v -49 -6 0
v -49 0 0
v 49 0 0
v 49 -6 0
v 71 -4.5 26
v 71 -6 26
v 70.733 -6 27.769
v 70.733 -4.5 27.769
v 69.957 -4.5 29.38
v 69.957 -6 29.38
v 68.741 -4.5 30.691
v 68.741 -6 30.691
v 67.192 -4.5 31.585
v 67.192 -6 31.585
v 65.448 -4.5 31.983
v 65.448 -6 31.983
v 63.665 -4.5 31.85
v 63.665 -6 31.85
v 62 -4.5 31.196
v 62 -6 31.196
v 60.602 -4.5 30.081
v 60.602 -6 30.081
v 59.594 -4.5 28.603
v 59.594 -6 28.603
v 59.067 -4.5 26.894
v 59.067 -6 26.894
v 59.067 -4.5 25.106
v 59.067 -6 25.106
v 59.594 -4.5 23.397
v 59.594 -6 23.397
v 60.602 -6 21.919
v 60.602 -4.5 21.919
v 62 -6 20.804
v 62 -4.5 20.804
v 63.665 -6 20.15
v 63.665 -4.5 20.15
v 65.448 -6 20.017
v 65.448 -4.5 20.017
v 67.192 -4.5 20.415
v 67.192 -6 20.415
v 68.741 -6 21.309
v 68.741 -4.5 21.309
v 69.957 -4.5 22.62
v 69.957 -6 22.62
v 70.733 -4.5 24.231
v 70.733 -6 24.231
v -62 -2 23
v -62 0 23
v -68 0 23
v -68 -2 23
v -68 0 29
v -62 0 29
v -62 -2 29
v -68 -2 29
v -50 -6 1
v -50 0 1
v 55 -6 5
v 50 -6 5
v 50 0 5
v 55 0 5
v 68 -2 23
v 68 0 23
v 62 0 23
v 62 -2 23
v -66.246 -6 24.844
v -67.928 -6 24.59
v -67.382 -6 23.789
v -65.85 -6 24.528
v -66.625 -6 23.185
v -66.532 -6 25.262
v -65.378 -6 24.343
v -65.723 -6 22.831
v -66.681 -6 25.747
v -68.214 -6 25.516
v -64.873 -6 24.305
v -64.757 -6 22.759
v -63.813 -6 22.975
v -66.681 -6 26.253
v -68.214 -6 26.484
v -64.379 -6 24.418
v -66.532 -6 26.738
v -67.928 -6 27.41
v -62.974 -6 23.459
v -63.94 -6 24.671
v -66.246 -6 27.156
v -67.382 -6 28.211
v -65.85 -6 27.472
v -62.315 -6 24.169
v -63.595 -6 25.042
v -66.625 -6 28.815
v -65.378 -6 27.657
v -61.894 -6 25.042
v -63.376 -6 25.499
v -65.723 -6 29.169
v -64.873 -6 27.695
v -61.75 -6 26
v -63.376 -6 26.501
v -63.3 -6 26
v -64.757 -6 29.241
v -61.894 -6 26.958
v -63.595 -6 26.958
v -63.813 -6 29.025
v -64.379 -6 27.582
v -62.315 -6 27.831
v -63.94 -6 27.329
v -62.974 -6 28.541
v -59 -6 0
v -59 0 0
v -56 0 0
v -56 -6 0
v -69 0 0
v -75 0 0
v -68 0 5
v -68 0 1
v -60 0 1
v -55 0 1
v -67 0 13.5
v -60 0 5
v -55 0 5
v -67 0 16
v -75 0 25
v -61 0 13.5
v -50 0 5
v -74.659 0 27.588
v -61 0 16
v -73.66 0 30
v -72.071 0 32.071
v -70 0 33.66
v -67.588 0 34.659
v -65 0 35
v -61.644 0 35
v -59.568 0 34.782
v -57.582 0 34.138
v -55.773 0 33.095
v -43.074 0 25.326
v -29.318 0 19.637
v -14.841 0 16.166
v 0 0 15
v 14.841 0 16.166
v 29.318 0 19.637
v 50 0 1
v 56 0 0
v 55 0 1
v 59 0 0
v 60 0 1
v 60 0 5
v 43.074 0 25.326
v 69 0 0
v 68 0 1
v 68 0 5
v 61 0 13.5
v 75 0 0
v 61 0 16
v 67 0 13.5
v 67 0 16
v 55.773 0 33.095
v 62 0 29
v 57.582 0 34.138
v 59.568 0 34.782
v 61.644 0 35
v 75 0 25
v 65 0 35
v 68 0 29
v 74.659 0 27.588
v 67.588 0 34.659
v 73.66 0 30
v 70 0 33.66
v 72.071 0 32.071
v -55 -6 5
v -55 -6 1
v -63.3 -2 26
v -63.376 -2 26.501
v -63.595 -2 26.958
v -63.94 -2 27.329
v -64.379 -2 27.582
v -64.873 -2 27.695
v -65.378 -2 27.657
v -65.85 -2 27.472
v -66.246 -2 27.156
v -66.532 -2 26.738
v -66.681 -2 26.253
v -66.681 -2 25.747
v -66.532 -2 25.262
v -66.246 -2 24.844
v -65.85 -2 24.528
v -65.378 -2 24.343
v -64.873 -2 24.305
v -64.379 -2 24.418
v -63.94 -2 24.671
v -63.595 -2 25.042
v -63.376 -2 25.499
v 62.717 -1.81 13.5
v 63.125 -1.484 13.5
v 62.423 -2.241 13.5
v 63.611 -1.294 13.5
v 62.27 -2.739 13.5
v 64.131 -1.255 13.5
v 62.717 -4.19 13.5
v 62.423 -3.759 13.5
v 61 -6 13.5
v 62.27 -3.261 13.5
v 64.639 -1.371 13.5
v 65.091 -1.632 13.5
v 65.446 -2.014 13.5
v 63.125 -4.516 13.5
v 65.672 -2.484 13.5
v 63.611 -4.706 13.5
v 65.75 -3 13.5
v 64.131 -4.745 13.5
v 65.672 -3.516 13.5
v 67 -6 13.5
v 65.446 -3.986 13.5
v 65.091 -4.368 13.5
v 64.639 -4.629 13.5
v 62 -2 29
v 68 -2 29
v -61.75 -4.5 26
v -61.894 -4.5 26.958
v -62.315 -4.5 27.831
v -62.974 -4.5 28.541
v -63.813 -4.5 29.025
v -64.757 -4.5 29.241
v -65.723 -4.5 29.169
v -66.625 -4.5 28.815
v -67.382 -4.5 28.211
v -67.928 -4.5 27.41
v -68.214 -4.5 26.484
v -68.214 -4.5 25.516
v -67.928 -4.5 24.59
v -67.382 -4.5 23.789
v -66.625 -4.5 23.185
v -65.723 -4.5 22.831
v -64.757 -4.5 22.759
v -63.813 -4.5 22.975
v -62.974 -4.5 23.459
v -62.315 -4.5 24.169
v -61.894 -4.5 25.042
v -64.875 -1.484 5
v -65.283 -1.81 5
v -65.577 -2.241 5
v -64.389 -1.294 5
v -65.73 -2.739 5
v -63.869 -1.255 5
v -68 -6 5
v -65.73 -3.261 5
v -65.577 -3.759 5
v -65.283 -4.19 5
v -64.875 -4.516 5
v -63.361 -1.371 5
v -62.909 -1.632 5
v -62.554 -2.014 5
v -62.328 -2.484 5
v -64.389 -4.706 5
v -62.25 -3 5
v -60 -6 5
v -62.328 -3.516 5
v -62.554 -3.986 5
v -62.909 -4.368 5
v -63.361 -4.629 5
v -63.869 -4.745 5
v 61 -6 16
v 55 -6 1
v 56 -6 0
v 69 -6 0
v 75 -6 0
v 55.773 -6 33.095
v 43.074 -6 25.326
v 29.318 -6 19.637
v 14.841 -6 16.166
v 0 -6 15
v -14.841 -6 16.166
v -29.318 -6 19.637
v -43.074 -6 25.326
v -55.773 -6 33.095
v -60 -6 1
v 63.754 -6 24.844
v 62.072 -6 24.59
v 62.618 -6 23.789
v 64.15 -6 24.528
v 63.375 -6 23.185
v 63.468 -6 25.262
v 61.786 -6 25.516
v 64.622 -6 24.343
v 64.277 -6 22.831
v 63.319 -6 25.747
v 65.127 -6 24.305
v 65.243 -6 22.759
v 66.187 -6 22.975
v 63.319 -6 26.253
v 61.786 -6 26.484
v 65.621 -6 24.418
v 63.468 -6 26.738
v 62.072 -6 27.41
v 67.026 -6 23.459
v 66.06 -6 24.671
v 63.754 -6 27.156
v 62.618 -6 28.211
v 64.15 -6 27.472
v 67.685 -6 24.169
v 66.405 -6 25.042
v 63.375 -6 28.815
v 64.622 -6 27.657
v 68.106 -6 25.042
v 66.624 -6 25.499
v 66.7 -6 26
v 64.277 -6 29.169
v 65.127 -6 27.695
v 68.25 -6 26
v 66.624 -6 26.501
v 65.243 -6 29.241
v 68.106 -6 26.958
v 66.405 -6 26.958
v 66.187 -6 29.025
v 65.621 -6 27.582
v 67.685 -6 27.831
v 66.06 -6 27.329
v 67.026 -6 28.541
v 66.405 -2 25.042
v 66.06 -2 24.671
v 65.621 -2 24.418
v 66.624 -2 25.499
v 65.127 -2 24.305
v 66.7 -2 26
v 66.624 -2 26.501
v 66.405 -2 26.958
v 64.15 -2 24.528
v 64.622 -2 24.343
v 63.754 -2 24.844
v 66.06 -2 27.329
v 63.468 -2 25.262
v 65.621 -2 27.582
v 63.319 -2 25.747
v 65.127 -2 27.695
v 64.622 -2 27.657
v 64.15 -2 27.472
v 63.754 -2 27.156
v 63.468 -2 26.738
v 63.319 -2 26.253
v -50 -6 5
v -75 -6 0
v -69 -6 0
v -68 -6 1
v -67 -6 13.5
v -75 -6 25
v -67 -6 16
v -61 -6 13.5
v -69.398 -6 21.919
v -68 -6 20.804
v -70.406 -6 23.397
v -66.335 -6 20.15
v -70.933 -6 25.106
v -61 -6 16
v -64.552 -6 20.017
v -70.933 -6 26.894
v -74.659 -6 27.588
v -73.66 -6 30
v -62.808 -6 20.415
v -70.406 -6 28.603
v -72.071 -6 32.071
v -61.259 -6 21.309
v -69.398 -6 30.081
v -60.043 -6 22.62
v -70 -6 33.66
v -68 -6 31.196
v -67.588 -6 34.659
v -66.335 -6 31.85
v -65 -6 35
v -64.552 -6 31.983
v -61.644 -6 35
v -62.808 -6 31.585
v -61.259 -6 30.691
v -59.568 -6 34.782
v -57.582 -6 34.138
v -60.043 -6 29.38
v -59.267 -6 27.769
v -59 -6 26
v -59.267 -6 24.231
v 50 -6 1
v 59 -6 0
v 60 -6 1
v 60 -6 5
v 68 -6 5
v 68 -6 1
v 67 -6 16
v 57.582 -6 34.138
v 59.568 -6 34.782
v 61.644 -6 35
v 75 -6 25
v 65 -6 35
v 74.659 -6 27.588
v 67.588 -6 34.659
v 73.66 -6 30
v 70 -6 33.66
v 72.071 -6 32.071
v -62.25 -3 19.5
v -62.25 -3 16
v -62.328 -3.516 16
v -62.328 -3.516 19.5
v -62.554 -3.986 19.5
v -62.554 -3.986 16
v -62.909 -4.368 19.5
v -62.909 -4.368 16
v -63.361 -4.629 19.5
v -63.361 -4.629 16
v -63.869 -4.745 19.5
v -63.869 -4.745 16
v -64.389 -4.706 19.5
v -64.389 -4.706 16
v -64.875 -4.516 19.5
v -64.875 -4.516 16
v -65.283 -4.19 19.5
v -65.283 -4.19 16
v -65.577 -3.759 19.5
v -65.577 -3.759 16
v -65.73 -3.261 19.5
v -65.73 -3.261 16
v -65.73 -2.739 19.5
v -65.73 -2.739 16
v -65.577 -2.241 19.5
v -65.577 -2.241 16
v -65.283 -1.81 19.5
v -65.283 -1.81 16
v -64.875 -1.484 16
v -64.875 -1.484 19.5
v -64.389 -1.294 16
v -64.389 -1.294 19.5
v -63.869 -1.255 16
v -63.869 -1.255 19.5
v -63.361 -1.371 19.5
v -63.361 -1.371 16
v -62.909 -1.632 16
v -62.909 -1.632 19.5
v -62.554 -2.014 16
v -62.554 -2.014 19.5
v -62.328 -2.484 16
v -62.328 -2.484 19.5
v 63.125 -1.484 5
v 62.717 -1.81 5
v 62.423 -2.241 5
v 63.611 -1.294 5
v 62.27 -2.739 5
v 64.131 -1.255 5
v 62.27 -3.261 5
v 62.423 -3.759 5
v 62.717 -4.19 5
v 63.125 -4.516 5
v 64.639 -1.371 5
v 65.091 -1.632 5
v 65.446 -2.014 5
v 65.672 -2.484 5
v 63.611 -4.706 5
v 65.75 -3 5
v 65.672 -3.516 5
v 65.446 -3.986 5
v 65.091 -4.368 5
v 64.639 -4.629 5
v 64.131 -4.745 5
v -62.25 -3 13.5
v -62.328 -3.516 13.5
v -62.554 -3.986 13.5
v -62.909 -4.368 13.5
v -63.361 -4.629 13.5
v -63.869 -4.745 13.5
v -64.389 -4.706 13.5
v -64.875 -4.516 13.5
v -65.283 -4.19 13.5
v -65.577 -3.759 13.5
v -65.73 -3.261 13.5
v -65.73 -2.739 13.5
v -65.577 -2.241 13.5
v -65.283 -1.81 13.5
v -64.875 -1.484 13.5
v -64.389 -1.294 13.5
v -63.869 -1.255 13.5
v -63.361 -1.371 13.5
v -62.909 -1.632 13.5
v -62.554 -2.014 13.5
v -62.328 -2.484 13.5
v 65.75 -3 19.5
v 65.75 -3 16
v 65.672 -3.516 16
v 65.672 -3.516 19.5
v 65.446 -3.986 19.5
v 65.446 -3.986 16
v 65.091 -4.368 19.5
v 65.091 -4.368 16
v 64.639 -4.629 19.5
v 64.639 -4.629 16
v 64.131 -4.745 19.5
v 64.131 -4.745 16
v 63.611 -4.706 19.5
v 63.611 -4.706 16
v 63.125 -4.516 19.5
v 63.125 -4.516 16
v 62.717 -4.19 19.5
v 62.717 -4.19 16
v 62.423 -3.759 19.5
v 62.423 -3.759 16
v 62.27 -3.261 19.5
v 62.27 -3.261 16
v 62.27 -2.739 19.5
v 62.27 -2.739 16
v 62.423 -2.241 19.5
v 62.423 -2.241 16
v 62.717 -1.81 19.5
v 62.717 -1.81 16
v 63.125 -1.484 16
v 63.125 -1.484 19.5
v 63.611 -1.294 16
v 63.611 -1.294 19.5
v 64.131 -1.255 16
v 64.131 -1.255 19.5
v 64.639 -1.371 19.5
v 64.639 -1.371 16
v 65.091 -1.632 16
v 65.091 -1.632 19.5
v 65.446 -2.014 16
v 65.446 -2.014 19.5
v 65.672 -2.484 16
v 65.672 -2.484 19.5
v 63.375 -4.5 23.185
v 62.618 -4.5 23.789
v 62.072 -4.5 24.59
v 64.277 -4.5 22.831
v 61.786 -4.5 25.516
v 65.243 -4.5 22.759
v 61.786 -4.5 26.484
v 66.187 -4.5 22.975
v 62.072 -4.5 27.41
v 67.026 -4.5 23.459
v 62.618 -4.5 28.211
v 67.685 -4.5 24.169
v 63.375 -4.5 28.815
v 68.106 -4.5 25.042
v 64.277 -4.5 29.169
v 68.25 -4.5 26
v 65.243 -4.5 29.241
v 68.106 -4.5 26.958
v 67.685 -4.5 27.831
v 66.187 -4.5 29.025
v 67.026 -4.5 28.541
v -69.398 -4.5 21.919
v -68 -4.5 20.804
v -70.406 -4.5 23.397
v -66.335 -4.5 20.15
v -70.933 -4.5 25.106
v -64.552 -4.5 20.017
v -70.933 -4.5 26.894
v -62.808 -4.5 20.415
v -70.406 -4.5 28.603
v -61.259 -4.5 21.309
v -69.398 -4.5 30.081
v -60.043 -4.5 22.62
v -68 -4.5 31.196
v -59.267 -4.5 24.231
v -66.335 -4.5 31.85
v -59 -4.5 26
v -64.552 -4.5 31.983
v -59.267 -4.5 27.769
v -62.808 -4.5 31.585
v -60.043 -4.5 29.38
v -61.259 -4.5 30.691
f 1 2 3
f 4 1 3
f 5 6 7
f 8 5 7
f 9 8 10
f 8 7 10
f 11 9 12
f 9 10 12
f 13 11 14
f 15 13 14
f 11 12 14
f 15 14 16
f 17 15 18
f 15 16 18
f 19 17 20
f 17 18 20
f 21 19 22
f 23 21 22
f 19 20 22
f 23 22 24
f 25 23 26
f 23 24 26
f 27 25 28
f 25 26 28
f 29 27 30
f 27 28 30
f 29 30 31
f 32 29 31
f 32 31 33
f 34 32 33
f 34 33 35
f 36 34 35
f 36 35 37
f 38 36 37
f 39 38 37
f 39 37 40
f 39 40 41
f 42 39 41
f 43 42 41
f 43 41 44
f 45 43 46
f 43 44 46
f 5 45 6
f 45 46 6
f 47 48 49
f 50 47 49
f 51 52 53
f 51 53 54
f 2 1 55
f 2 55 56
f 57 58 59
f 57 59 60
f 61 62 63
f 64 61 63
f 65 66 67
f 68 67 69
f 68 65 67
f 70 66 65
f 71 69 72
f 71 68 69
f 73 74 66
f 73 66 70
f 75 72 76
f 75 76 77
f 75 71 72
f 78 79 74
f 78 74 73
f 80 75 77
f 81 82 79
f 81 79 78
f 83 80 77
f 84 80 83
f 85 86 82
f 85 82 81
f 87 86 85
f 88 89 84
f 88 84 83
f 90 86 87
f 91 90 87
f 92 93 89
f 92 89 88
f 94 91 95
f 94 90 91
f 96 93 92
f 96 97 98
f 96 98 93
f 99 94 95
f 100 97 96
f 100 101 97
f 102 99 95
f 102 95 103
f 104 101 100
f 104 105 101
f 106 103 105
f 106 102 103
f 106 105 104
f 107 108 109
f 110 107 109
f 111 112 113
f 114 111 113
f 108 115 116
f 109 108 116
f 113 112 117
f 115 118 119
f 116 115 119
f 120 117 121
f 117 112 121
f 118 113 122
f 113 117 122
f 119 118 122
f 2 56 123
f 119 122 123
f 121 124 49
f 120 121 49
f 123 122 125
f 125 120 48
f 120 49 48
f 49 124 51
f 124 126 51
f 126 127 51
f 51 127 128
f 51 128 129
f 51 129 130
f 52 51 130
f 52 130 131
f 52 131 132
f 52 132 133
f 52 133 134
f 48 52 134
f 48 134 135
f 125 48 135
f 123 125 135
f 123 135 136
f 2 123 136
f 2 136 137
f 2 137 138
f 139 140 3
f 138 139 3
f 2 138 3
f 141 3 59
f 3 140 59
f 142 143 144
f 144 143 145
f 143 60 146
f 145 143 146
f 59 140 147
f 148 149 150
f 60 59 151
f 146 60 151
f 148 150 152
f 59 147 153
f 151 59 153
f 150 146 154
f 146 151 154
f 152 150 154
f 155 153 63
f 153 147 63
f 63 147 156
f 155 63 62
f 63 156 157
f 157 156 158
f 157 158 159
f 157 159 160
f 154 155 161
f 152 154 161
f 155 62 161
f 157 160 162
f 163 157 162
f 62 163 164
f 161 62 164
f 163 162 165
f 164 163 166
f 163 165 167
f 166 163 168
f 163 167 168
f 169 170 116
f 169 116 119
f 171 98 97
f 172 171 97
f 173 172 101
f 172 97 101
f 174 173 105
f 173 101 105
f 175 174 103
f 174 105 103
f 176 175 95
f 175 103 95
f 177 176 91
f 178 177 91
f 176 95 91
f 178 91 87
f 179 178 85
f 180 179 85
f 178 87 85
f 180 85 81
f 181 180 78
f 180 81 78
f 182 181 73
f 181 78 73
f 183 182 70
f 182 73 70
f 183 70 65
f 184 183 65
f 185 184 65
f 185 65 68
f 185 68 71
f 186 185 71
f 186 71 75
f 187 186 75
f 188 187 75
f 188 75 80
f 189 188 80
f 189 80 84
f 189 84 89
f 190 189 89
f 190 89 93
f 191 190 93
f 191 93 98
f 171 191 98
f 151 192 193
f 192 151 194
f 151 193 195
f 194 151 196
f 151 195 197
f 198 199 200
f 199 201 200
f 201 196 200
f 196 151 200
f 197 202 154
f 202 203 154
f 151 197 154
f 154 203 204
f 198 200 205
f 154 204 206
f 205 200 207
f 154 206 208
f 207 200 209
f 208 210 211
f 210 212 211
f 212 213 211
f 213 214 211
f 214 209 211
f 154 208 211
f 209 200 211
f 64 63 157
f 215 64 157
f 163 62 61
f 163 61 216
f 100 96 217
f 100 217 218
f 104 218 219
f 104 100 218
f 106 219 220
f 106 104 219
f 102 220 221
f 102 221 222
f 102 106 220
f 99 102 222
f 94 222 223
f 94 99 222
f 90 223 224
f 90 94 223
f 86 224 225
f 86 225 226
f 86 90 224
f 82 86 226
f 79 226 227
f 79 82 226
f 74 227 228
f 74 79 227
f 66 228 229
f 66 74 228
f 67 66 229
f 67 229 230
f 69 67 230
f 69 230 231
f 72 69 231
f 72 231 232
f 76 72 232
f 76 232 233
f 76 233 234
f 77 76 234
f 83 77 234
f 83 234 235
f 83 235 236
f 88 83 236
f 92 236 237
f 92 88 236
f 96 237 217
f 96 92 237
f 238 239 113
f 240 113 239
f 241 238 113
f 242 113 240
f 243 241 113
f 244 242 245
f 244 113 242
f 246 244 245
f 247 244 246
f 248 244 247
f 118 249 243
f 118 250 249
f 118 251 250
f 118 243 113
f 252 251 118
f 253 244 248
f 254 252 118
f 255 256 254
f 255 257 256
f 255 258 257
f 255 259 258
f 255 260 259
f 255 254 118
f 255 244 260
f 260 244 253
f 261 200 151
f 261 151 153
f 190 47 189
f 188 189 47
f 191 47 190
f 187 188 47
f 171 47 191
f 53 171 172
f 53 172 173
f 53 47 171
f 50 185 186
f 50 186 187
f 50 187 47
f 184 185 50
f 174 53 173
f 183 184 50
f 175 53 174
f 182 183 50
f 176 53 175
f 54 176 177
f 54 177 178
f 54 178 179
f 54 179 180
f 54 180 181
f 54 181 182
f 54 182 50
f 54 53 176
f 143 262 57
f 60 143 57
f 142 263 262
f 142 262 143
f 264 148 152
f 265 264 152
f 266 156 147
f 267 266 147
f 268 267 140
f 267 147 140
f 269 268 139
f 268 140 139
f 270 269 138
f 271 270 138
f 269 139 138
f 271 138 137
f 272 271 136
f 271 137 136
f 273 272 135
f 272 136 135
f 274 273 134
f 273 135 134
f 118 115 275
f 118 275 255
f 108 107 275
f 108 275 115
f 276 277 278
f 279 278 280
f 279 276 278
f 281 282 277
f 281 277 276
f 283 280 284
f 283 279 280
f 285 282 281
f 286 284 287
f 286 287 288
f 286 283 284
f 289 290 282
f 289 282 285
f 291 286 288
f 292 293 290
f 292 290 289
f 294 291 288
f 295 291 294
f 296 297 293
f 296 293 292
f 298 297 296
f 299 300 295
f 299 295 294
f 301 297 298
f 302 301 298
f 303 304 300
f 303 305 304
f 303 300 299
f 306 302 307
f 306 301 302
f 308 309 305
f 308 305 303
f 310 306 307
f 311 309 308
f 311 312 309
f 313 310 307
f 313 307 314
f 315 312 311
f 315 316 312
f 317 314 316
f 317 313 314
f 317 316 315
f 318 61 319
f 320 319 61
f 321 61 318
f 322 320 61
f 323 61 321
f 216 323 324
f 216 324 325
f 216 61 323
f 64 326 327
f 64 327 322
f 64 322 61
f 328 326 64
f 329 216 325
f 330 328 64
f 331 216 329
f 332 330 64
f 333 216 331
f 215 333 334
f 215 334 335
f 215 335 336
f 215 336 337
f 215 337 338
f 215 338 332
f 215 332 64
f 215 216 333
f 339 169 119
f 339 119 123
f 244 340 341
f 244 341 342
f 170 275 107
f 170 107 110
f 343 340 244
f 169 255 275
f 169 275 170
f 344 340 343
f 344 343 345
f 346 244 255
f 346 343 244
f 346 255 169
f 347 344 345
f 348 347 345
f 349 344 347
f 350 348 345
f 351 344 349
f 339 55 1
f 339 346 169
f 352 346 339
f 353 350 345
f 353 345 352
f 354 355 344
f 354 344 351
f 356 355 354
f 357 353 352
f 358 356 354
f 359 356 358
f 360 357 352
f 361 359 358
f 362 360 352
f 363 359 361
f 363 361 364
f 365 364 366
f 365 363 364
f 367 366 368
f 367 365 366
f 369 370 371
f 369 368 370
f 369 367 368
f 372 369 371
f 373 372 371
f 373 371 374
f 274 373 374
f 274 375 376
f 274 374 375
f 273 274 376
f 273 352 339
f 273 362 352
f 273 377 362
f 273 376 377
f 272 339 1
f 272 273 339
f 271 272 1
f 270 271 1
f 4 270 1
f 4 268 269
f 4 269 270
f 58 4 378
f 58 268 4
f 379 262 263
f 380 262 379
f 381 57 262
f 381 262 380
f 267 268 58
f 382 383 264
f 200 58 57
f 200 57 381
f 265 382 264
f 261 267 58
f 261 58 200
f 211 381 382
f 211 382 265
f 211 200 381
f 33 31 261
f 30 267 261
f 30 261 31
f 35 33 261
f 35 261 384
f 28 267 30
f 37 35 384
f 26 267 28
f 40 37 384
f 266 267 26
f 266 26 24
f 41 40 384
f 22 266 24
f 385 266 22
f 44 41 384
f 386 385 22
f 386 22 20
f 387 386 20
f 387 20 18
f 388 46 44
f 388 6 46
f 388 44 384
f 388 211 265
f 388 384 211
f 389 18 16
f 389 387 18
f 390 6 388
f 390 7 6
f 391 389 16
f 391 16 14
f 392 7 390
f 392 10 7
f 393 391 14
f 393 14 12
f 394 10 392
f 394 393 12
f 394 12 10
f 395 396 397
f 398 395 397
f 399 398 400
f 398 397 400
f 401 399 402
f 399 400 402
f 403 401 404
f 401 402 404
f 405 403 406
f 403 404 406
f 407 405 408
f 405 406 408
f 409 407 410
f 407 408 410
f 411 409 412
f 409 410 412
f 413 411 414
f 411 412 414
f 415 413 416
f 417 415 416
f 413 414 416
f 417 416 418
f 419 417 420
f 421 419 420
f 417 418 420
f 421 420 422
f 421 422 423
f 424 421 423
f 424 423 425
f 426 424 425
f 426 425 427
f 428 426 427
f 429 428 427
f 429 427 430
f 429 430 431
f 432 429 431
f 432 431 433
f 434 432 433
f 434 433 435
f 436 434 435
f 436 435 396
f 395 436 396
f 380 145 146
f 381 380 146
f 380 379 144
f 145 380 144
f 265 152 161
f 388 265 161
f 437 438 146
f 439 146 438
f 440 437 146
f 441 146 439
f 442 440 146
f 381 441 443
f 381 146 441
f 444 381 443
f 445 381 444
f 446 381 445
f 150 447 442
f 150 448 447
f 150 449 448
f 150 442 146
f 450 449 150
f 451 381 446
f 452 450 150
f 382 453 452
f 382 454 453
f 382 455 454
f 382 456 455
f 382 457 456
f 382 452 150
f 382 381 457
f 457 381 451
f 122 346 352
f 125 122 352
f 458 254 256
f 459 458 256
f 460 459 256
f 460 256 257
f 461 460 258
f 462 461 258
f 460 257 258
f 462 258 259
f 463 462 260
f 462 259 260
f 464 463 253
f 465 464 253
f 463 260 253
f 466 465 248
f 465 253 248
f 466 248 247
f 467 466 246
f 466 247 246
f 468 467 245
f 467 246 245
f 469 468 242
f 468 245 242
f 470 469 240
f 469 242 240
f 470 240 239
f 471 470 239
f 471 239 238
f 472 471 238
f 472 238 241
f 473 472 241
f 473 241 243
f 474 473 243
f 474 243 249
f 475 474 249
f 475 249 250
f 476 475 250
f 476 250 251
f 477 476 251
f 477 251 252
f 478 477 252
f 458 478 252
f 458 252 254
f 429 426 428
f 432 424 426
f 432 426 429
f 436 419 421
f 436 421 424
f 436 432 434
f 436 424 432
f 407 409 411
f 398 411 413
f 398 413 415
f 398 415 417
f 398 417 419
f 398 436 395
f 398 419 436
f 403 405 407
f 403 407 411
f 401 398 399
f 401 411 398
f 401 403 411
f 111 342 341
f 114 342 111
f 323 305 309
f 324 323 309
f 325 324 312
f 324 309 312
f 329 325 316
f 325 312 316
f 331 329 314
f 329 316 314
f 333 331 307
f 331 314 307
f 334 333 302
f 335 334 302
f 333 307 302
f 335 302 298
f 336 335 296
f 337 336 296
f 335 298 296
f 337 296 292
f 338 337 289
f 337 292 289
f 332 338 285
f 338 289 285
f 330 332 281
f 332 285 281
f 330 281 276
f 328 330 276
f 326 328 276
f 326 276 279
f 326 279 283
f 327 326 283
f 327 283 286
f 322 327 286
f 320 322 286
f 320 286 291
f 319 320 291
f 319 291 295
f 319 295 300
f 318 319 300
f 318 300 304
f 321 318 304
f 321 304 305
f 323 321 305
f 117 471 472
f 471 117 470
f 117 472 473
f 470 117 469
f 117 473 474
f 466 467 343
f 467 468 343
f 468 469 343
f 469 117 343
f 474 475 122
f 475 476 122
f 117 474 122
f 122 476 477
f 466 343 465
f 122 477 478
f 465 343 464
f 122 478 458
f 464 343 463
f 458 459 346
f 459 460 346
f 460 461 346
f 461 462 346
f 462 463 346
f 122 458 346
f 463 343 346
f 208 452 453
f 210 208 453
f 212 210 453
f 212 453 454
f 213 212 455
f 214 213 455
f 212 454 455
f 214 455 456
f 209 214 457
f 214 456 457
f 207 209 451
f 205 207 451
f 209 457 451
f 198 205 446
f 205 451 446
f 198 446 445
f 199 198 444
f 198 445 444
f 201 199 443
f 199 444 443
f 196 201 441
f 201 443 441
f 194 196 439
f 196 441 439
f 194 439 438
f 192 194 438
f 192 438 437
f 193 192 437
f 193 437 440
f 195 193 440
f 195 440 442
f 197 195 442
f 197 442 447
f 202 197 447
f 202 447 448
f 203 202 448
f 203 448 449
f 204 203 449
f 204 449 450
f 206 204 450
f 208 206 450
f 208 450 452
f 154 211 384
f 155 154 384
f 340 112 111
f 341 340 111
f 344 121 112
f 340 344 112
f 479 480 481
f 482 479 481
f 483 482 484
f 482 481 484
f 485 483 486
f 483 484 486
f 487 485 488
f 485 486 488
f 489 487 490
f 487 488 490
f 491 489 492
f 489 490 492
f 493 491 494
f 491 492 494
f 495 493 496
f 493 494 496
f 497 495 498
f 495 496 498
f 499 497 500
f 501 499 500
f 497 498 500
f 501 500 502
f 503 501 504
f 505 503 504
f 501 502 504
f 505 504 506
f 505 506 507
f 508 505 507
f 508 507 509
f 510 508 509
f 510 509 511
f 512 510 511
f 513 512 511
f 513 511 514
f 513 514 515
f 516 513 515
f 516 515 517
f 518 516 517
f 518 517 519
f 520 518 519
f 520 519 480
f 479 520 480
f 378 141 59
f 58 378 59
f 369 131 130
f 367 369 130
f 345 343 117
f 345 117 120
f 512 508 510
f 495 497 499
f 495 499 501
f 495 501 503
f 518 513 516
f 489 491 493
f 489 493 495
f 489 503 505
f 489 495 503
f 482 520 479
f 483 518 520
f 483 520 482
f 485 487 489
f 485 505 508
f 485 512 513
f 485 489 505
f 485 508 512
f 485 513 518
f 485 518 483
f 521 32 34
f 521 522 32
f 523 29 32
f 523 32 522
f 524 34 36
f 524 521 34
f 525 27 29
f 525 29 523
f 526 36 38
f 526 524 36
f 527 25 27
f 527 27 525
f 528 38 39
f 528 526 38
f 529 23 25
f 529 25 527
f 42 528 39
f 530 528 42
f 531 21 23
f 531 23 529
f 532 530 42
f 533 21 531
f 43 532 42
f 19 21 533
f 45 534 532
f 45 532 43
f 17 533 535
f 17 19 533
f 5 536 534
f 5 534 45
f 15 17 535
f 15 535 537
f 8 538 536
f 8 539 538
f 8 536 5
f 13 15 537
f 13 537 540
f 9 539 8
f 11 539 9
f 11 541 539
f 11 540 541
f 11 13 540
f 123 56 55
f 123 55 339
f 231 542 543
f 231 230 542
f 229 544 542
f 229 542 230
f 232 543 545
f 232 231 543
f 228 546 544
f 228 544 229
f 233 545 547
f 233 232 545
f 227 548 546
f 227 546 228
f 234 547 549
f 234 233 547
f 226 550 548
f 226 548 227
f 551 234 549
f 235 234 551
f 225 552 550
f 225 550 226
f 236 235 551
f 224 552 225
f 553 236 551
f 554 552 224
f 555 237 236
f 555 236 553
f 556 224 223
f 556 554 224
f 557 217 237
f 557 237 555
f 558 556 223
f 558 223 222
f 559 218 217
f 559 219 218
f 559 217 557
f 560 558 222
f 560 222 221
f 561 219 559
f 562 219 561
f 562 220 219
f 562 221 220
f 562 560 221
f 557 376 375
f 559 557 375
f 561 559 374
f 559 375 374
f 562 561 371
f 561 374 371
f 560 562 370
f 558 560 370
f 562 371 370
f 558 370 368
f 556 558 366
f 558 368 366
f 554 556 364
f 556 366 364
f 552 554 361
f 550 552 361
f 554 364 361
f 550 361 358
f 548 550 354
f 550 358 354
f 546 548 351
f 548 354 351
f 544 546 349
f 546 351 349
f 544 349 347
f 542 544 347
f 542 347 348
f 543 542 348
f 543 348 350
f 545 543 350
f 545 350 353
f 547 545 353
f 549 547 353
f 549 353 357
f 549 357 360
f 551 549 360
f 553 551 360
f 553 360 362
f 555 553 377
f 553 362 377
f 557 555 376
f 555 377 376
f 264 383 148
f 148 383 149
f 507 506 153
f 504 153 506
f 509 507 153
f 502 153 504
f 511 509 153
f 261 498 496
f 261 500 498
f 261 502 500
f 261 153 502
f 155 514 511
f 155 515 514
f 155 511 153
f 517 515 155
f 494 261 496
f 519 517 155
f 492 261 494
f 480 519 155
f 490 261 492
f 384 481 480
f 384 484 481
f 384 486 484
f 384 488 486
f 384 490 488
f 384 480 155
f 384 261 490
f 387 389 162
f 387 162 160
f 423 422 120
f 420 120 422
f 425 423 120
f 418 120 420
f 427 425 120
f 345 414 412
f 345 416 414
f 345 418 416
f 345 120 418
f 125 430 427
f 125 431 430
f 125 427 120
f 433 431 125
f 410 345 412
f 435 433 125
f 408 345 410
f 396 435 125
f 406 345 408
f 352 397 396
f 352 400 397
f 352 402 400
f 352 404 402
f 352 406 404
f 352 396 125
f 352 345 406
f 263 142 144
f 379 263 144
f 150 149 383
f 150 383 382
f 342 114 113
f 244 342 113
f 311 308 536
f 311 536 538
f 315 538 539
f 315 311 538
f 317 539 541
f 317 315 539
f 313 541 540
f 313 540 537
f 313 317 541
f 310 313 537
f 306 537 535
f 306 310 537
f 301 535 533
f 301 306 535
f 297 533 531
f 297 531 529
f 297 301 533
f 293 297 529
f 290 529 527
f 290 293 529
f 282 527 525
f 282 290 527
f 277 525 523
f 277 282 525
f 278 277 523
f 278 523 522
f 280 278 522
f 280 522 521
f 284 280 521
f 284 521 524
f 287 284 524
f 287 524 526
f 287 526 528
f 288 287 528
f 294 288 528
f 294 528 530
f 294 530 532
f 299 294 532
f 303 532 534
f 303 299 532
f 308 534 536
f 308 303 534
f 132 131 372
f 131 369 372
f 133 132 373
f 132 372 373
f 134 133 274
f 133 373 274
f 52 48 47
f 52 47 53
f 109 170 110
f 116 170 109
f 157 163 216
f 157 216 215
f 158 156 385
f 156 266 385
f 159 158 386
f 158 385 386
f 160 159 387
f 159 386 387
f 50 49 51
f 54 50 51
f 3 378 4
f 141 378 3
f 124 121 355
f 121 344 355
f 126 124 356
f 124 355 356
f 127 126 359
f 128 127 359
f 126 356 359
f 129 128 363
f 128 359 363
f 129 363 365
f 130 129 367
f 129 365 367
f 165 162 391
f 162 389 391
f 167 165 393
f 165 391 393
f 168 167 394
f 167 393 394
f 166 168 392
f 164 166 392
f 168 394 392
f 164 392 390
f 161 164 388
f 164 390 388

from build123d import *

# Parameters (mm, degrees)
F1_DEPTH  = 6
F2_R      = 6
F2_R_2    = 3.25
F3_DEPTH  = 1.5
F4_W      = 8
F4_H      = 5
F4_W_2    = 6
F4_H_2    = 2.5
F4_W_3    = 5
F5_DEPTH  = 6.001
F6_R      = 10
F7_SIZE   = 1
F8_R      = 1.75
F9_DEPTH  = 14.5
F10_R     = 1.75
F11_DEPTH = 14.5
F12_R     = 1.7
F13_DEPTH = 6.001
F14_R     = 1.7
F15_DEPTH = 6.001
F16_W     = 6
F16_H     = 6
F16_R     = 1.7
F17_DEPTH = 2


with BuildPart() as f1:
    # F0 (on Front) → F1 (new body)
    with BuildSketch(Plane.XZ):
        with BuildLine():
            Line((-75, 0), (75, 0))
            Line((75, 0), (75, 35))
            Line((75, 35), (58.3095189485, 35))
            ThreePointArc((58.3095189485, 35), (0, 15), (-58.3095189485, 35))
            Line((-58.3095189485, 35), (-75, 35))
            Line((-75, 35), (-75, 0))
        make_face()
    extrude(amount=F1_DEPTH)

    # F2 (on face) → F3 (cut)
    with BuildSketch(Plane.XZ.offset(6)):
        with Locations((-65, 26)):
            Circle(F2_R)
        with Locations((-65, 26)):
            Circle(F2_R_2, mode=Mode.SUBTRACT)
        with Locations((65, 26)):
            Circle(F2_R)
        with Locations((65, 26)):
            Circle(F2_R_2, mode=Mode.SUBTRACT)
    extrude(amount=-F3_DEPTH, mode=Mode.SUBTRACT)

    # F4 (on face) → F5 (cut, through all)
    with BuildSketch(Plane.XZ.offset(6)):
        with Locations((-64, 2.5)):
            Rectangle(F4_W, F4_H)
        with Locations((64, 2.5)):
            Rectangle(F4_W, F4_H)
        with Locations((-64, 14.75)):
            Rectangle(F4_W_2, F4_H_2)
        with Locations((64, 14.75)):
            Rectangle(F4_W_2, F4_H_2)
        with Locations((-52.5, 2.5)):
            Rectangle(F4_W_3, F4_H)
        with Locations((52.5, 2.5)):
            Rectangle(F4_W_3, F4_H)
    extrude(amount=-F5_DEPTH, mode=Mode.SUBTRACT)

    # F6
    f6_edges = [f1.edges().sort_by_distance(p)[0] for p in [
        (-75, -3, 35),
        (75, -3, 35),
        (58.309519, -3, 35),
        (-58.309519, -3, 35),
    ]]
    fillet(f6_edges, radius=F6_R)

    # F7
    f7_edges = [f1.edges().sort_by_distance(p)[0] for p in [
        (-68, -3, 0),
        (-60, -3, 0),
        (60, -3, 0),
        (68, -3, 0),
        (-55, -3, 0),
        (-50, -3, 0),
        (50, -3, 0),
        (55, -3, 0),
    ]]
    chamfer(f7_edges, length=F7_SIZE)

    # F8 (on face) → F9 (cut)
    with BuildSketch(Plane(origin=(0, 0, 5), x_dir=(1, 0, 0), z_dir=(0, 0, -1))):
        with Locations((-64, 3)):
            Circle(F8_R)
    extrude(amount=-F9_DEPTH, mode=Mode.SUBTRACT)

    # F10 (on face) → F11 (cut)
    with BuildSketch(Plane(origin=(0, 0, 5), x_dir=(1, 0, 0), z_dir=(0, 0, -1))):
        with Locations((64, 3)):
            Circle(F10_R)
    extrude(amount=-F11_DEPTH, mode=Mode.SUBTRACT)

    # F12 (on face) → F13 (cut, through all)
    with BuildSketch(Plane.XZ.offset(6)):
        with Locations((-65, 26)):
            Circle(F12_R)
    extrude(amount=-F13_DEPTH, mode=Mode.SUBTRACT)

    # F14 (on face) → F15 (cut, through all)
    with BuildSketch(Plane.XZ.offset(6)):
        with Locations((65, 26)):
            Circle(F14_R)
    extrude(amount=-F15_DEPTH, mode=Mode.SUBTRACT)

    # F16 (on face) → F17 (cut)
    with BuildSketch(Plane(origin=(0, 0, 0), x_dir=(-1, 0, 0), z_dir=(0, 1, 0))):
        with Locations((65, 26)):
            Rectangle(F16_W, F16_H)
        with Locations((65, 26)):
            Circle(F16_R, mode=Mode.SUBTRACT)
        with Locations((-65, 26)):
            Rectangle(F16_W, F16_H)
        with Locations((-65, 26)):
            Circle(F16_R, mode=Mode.SUBTRACT)
    extrude(amount=-F17_DEPTH, mode=Mode.SUBTRACT)


solid = f1.part
